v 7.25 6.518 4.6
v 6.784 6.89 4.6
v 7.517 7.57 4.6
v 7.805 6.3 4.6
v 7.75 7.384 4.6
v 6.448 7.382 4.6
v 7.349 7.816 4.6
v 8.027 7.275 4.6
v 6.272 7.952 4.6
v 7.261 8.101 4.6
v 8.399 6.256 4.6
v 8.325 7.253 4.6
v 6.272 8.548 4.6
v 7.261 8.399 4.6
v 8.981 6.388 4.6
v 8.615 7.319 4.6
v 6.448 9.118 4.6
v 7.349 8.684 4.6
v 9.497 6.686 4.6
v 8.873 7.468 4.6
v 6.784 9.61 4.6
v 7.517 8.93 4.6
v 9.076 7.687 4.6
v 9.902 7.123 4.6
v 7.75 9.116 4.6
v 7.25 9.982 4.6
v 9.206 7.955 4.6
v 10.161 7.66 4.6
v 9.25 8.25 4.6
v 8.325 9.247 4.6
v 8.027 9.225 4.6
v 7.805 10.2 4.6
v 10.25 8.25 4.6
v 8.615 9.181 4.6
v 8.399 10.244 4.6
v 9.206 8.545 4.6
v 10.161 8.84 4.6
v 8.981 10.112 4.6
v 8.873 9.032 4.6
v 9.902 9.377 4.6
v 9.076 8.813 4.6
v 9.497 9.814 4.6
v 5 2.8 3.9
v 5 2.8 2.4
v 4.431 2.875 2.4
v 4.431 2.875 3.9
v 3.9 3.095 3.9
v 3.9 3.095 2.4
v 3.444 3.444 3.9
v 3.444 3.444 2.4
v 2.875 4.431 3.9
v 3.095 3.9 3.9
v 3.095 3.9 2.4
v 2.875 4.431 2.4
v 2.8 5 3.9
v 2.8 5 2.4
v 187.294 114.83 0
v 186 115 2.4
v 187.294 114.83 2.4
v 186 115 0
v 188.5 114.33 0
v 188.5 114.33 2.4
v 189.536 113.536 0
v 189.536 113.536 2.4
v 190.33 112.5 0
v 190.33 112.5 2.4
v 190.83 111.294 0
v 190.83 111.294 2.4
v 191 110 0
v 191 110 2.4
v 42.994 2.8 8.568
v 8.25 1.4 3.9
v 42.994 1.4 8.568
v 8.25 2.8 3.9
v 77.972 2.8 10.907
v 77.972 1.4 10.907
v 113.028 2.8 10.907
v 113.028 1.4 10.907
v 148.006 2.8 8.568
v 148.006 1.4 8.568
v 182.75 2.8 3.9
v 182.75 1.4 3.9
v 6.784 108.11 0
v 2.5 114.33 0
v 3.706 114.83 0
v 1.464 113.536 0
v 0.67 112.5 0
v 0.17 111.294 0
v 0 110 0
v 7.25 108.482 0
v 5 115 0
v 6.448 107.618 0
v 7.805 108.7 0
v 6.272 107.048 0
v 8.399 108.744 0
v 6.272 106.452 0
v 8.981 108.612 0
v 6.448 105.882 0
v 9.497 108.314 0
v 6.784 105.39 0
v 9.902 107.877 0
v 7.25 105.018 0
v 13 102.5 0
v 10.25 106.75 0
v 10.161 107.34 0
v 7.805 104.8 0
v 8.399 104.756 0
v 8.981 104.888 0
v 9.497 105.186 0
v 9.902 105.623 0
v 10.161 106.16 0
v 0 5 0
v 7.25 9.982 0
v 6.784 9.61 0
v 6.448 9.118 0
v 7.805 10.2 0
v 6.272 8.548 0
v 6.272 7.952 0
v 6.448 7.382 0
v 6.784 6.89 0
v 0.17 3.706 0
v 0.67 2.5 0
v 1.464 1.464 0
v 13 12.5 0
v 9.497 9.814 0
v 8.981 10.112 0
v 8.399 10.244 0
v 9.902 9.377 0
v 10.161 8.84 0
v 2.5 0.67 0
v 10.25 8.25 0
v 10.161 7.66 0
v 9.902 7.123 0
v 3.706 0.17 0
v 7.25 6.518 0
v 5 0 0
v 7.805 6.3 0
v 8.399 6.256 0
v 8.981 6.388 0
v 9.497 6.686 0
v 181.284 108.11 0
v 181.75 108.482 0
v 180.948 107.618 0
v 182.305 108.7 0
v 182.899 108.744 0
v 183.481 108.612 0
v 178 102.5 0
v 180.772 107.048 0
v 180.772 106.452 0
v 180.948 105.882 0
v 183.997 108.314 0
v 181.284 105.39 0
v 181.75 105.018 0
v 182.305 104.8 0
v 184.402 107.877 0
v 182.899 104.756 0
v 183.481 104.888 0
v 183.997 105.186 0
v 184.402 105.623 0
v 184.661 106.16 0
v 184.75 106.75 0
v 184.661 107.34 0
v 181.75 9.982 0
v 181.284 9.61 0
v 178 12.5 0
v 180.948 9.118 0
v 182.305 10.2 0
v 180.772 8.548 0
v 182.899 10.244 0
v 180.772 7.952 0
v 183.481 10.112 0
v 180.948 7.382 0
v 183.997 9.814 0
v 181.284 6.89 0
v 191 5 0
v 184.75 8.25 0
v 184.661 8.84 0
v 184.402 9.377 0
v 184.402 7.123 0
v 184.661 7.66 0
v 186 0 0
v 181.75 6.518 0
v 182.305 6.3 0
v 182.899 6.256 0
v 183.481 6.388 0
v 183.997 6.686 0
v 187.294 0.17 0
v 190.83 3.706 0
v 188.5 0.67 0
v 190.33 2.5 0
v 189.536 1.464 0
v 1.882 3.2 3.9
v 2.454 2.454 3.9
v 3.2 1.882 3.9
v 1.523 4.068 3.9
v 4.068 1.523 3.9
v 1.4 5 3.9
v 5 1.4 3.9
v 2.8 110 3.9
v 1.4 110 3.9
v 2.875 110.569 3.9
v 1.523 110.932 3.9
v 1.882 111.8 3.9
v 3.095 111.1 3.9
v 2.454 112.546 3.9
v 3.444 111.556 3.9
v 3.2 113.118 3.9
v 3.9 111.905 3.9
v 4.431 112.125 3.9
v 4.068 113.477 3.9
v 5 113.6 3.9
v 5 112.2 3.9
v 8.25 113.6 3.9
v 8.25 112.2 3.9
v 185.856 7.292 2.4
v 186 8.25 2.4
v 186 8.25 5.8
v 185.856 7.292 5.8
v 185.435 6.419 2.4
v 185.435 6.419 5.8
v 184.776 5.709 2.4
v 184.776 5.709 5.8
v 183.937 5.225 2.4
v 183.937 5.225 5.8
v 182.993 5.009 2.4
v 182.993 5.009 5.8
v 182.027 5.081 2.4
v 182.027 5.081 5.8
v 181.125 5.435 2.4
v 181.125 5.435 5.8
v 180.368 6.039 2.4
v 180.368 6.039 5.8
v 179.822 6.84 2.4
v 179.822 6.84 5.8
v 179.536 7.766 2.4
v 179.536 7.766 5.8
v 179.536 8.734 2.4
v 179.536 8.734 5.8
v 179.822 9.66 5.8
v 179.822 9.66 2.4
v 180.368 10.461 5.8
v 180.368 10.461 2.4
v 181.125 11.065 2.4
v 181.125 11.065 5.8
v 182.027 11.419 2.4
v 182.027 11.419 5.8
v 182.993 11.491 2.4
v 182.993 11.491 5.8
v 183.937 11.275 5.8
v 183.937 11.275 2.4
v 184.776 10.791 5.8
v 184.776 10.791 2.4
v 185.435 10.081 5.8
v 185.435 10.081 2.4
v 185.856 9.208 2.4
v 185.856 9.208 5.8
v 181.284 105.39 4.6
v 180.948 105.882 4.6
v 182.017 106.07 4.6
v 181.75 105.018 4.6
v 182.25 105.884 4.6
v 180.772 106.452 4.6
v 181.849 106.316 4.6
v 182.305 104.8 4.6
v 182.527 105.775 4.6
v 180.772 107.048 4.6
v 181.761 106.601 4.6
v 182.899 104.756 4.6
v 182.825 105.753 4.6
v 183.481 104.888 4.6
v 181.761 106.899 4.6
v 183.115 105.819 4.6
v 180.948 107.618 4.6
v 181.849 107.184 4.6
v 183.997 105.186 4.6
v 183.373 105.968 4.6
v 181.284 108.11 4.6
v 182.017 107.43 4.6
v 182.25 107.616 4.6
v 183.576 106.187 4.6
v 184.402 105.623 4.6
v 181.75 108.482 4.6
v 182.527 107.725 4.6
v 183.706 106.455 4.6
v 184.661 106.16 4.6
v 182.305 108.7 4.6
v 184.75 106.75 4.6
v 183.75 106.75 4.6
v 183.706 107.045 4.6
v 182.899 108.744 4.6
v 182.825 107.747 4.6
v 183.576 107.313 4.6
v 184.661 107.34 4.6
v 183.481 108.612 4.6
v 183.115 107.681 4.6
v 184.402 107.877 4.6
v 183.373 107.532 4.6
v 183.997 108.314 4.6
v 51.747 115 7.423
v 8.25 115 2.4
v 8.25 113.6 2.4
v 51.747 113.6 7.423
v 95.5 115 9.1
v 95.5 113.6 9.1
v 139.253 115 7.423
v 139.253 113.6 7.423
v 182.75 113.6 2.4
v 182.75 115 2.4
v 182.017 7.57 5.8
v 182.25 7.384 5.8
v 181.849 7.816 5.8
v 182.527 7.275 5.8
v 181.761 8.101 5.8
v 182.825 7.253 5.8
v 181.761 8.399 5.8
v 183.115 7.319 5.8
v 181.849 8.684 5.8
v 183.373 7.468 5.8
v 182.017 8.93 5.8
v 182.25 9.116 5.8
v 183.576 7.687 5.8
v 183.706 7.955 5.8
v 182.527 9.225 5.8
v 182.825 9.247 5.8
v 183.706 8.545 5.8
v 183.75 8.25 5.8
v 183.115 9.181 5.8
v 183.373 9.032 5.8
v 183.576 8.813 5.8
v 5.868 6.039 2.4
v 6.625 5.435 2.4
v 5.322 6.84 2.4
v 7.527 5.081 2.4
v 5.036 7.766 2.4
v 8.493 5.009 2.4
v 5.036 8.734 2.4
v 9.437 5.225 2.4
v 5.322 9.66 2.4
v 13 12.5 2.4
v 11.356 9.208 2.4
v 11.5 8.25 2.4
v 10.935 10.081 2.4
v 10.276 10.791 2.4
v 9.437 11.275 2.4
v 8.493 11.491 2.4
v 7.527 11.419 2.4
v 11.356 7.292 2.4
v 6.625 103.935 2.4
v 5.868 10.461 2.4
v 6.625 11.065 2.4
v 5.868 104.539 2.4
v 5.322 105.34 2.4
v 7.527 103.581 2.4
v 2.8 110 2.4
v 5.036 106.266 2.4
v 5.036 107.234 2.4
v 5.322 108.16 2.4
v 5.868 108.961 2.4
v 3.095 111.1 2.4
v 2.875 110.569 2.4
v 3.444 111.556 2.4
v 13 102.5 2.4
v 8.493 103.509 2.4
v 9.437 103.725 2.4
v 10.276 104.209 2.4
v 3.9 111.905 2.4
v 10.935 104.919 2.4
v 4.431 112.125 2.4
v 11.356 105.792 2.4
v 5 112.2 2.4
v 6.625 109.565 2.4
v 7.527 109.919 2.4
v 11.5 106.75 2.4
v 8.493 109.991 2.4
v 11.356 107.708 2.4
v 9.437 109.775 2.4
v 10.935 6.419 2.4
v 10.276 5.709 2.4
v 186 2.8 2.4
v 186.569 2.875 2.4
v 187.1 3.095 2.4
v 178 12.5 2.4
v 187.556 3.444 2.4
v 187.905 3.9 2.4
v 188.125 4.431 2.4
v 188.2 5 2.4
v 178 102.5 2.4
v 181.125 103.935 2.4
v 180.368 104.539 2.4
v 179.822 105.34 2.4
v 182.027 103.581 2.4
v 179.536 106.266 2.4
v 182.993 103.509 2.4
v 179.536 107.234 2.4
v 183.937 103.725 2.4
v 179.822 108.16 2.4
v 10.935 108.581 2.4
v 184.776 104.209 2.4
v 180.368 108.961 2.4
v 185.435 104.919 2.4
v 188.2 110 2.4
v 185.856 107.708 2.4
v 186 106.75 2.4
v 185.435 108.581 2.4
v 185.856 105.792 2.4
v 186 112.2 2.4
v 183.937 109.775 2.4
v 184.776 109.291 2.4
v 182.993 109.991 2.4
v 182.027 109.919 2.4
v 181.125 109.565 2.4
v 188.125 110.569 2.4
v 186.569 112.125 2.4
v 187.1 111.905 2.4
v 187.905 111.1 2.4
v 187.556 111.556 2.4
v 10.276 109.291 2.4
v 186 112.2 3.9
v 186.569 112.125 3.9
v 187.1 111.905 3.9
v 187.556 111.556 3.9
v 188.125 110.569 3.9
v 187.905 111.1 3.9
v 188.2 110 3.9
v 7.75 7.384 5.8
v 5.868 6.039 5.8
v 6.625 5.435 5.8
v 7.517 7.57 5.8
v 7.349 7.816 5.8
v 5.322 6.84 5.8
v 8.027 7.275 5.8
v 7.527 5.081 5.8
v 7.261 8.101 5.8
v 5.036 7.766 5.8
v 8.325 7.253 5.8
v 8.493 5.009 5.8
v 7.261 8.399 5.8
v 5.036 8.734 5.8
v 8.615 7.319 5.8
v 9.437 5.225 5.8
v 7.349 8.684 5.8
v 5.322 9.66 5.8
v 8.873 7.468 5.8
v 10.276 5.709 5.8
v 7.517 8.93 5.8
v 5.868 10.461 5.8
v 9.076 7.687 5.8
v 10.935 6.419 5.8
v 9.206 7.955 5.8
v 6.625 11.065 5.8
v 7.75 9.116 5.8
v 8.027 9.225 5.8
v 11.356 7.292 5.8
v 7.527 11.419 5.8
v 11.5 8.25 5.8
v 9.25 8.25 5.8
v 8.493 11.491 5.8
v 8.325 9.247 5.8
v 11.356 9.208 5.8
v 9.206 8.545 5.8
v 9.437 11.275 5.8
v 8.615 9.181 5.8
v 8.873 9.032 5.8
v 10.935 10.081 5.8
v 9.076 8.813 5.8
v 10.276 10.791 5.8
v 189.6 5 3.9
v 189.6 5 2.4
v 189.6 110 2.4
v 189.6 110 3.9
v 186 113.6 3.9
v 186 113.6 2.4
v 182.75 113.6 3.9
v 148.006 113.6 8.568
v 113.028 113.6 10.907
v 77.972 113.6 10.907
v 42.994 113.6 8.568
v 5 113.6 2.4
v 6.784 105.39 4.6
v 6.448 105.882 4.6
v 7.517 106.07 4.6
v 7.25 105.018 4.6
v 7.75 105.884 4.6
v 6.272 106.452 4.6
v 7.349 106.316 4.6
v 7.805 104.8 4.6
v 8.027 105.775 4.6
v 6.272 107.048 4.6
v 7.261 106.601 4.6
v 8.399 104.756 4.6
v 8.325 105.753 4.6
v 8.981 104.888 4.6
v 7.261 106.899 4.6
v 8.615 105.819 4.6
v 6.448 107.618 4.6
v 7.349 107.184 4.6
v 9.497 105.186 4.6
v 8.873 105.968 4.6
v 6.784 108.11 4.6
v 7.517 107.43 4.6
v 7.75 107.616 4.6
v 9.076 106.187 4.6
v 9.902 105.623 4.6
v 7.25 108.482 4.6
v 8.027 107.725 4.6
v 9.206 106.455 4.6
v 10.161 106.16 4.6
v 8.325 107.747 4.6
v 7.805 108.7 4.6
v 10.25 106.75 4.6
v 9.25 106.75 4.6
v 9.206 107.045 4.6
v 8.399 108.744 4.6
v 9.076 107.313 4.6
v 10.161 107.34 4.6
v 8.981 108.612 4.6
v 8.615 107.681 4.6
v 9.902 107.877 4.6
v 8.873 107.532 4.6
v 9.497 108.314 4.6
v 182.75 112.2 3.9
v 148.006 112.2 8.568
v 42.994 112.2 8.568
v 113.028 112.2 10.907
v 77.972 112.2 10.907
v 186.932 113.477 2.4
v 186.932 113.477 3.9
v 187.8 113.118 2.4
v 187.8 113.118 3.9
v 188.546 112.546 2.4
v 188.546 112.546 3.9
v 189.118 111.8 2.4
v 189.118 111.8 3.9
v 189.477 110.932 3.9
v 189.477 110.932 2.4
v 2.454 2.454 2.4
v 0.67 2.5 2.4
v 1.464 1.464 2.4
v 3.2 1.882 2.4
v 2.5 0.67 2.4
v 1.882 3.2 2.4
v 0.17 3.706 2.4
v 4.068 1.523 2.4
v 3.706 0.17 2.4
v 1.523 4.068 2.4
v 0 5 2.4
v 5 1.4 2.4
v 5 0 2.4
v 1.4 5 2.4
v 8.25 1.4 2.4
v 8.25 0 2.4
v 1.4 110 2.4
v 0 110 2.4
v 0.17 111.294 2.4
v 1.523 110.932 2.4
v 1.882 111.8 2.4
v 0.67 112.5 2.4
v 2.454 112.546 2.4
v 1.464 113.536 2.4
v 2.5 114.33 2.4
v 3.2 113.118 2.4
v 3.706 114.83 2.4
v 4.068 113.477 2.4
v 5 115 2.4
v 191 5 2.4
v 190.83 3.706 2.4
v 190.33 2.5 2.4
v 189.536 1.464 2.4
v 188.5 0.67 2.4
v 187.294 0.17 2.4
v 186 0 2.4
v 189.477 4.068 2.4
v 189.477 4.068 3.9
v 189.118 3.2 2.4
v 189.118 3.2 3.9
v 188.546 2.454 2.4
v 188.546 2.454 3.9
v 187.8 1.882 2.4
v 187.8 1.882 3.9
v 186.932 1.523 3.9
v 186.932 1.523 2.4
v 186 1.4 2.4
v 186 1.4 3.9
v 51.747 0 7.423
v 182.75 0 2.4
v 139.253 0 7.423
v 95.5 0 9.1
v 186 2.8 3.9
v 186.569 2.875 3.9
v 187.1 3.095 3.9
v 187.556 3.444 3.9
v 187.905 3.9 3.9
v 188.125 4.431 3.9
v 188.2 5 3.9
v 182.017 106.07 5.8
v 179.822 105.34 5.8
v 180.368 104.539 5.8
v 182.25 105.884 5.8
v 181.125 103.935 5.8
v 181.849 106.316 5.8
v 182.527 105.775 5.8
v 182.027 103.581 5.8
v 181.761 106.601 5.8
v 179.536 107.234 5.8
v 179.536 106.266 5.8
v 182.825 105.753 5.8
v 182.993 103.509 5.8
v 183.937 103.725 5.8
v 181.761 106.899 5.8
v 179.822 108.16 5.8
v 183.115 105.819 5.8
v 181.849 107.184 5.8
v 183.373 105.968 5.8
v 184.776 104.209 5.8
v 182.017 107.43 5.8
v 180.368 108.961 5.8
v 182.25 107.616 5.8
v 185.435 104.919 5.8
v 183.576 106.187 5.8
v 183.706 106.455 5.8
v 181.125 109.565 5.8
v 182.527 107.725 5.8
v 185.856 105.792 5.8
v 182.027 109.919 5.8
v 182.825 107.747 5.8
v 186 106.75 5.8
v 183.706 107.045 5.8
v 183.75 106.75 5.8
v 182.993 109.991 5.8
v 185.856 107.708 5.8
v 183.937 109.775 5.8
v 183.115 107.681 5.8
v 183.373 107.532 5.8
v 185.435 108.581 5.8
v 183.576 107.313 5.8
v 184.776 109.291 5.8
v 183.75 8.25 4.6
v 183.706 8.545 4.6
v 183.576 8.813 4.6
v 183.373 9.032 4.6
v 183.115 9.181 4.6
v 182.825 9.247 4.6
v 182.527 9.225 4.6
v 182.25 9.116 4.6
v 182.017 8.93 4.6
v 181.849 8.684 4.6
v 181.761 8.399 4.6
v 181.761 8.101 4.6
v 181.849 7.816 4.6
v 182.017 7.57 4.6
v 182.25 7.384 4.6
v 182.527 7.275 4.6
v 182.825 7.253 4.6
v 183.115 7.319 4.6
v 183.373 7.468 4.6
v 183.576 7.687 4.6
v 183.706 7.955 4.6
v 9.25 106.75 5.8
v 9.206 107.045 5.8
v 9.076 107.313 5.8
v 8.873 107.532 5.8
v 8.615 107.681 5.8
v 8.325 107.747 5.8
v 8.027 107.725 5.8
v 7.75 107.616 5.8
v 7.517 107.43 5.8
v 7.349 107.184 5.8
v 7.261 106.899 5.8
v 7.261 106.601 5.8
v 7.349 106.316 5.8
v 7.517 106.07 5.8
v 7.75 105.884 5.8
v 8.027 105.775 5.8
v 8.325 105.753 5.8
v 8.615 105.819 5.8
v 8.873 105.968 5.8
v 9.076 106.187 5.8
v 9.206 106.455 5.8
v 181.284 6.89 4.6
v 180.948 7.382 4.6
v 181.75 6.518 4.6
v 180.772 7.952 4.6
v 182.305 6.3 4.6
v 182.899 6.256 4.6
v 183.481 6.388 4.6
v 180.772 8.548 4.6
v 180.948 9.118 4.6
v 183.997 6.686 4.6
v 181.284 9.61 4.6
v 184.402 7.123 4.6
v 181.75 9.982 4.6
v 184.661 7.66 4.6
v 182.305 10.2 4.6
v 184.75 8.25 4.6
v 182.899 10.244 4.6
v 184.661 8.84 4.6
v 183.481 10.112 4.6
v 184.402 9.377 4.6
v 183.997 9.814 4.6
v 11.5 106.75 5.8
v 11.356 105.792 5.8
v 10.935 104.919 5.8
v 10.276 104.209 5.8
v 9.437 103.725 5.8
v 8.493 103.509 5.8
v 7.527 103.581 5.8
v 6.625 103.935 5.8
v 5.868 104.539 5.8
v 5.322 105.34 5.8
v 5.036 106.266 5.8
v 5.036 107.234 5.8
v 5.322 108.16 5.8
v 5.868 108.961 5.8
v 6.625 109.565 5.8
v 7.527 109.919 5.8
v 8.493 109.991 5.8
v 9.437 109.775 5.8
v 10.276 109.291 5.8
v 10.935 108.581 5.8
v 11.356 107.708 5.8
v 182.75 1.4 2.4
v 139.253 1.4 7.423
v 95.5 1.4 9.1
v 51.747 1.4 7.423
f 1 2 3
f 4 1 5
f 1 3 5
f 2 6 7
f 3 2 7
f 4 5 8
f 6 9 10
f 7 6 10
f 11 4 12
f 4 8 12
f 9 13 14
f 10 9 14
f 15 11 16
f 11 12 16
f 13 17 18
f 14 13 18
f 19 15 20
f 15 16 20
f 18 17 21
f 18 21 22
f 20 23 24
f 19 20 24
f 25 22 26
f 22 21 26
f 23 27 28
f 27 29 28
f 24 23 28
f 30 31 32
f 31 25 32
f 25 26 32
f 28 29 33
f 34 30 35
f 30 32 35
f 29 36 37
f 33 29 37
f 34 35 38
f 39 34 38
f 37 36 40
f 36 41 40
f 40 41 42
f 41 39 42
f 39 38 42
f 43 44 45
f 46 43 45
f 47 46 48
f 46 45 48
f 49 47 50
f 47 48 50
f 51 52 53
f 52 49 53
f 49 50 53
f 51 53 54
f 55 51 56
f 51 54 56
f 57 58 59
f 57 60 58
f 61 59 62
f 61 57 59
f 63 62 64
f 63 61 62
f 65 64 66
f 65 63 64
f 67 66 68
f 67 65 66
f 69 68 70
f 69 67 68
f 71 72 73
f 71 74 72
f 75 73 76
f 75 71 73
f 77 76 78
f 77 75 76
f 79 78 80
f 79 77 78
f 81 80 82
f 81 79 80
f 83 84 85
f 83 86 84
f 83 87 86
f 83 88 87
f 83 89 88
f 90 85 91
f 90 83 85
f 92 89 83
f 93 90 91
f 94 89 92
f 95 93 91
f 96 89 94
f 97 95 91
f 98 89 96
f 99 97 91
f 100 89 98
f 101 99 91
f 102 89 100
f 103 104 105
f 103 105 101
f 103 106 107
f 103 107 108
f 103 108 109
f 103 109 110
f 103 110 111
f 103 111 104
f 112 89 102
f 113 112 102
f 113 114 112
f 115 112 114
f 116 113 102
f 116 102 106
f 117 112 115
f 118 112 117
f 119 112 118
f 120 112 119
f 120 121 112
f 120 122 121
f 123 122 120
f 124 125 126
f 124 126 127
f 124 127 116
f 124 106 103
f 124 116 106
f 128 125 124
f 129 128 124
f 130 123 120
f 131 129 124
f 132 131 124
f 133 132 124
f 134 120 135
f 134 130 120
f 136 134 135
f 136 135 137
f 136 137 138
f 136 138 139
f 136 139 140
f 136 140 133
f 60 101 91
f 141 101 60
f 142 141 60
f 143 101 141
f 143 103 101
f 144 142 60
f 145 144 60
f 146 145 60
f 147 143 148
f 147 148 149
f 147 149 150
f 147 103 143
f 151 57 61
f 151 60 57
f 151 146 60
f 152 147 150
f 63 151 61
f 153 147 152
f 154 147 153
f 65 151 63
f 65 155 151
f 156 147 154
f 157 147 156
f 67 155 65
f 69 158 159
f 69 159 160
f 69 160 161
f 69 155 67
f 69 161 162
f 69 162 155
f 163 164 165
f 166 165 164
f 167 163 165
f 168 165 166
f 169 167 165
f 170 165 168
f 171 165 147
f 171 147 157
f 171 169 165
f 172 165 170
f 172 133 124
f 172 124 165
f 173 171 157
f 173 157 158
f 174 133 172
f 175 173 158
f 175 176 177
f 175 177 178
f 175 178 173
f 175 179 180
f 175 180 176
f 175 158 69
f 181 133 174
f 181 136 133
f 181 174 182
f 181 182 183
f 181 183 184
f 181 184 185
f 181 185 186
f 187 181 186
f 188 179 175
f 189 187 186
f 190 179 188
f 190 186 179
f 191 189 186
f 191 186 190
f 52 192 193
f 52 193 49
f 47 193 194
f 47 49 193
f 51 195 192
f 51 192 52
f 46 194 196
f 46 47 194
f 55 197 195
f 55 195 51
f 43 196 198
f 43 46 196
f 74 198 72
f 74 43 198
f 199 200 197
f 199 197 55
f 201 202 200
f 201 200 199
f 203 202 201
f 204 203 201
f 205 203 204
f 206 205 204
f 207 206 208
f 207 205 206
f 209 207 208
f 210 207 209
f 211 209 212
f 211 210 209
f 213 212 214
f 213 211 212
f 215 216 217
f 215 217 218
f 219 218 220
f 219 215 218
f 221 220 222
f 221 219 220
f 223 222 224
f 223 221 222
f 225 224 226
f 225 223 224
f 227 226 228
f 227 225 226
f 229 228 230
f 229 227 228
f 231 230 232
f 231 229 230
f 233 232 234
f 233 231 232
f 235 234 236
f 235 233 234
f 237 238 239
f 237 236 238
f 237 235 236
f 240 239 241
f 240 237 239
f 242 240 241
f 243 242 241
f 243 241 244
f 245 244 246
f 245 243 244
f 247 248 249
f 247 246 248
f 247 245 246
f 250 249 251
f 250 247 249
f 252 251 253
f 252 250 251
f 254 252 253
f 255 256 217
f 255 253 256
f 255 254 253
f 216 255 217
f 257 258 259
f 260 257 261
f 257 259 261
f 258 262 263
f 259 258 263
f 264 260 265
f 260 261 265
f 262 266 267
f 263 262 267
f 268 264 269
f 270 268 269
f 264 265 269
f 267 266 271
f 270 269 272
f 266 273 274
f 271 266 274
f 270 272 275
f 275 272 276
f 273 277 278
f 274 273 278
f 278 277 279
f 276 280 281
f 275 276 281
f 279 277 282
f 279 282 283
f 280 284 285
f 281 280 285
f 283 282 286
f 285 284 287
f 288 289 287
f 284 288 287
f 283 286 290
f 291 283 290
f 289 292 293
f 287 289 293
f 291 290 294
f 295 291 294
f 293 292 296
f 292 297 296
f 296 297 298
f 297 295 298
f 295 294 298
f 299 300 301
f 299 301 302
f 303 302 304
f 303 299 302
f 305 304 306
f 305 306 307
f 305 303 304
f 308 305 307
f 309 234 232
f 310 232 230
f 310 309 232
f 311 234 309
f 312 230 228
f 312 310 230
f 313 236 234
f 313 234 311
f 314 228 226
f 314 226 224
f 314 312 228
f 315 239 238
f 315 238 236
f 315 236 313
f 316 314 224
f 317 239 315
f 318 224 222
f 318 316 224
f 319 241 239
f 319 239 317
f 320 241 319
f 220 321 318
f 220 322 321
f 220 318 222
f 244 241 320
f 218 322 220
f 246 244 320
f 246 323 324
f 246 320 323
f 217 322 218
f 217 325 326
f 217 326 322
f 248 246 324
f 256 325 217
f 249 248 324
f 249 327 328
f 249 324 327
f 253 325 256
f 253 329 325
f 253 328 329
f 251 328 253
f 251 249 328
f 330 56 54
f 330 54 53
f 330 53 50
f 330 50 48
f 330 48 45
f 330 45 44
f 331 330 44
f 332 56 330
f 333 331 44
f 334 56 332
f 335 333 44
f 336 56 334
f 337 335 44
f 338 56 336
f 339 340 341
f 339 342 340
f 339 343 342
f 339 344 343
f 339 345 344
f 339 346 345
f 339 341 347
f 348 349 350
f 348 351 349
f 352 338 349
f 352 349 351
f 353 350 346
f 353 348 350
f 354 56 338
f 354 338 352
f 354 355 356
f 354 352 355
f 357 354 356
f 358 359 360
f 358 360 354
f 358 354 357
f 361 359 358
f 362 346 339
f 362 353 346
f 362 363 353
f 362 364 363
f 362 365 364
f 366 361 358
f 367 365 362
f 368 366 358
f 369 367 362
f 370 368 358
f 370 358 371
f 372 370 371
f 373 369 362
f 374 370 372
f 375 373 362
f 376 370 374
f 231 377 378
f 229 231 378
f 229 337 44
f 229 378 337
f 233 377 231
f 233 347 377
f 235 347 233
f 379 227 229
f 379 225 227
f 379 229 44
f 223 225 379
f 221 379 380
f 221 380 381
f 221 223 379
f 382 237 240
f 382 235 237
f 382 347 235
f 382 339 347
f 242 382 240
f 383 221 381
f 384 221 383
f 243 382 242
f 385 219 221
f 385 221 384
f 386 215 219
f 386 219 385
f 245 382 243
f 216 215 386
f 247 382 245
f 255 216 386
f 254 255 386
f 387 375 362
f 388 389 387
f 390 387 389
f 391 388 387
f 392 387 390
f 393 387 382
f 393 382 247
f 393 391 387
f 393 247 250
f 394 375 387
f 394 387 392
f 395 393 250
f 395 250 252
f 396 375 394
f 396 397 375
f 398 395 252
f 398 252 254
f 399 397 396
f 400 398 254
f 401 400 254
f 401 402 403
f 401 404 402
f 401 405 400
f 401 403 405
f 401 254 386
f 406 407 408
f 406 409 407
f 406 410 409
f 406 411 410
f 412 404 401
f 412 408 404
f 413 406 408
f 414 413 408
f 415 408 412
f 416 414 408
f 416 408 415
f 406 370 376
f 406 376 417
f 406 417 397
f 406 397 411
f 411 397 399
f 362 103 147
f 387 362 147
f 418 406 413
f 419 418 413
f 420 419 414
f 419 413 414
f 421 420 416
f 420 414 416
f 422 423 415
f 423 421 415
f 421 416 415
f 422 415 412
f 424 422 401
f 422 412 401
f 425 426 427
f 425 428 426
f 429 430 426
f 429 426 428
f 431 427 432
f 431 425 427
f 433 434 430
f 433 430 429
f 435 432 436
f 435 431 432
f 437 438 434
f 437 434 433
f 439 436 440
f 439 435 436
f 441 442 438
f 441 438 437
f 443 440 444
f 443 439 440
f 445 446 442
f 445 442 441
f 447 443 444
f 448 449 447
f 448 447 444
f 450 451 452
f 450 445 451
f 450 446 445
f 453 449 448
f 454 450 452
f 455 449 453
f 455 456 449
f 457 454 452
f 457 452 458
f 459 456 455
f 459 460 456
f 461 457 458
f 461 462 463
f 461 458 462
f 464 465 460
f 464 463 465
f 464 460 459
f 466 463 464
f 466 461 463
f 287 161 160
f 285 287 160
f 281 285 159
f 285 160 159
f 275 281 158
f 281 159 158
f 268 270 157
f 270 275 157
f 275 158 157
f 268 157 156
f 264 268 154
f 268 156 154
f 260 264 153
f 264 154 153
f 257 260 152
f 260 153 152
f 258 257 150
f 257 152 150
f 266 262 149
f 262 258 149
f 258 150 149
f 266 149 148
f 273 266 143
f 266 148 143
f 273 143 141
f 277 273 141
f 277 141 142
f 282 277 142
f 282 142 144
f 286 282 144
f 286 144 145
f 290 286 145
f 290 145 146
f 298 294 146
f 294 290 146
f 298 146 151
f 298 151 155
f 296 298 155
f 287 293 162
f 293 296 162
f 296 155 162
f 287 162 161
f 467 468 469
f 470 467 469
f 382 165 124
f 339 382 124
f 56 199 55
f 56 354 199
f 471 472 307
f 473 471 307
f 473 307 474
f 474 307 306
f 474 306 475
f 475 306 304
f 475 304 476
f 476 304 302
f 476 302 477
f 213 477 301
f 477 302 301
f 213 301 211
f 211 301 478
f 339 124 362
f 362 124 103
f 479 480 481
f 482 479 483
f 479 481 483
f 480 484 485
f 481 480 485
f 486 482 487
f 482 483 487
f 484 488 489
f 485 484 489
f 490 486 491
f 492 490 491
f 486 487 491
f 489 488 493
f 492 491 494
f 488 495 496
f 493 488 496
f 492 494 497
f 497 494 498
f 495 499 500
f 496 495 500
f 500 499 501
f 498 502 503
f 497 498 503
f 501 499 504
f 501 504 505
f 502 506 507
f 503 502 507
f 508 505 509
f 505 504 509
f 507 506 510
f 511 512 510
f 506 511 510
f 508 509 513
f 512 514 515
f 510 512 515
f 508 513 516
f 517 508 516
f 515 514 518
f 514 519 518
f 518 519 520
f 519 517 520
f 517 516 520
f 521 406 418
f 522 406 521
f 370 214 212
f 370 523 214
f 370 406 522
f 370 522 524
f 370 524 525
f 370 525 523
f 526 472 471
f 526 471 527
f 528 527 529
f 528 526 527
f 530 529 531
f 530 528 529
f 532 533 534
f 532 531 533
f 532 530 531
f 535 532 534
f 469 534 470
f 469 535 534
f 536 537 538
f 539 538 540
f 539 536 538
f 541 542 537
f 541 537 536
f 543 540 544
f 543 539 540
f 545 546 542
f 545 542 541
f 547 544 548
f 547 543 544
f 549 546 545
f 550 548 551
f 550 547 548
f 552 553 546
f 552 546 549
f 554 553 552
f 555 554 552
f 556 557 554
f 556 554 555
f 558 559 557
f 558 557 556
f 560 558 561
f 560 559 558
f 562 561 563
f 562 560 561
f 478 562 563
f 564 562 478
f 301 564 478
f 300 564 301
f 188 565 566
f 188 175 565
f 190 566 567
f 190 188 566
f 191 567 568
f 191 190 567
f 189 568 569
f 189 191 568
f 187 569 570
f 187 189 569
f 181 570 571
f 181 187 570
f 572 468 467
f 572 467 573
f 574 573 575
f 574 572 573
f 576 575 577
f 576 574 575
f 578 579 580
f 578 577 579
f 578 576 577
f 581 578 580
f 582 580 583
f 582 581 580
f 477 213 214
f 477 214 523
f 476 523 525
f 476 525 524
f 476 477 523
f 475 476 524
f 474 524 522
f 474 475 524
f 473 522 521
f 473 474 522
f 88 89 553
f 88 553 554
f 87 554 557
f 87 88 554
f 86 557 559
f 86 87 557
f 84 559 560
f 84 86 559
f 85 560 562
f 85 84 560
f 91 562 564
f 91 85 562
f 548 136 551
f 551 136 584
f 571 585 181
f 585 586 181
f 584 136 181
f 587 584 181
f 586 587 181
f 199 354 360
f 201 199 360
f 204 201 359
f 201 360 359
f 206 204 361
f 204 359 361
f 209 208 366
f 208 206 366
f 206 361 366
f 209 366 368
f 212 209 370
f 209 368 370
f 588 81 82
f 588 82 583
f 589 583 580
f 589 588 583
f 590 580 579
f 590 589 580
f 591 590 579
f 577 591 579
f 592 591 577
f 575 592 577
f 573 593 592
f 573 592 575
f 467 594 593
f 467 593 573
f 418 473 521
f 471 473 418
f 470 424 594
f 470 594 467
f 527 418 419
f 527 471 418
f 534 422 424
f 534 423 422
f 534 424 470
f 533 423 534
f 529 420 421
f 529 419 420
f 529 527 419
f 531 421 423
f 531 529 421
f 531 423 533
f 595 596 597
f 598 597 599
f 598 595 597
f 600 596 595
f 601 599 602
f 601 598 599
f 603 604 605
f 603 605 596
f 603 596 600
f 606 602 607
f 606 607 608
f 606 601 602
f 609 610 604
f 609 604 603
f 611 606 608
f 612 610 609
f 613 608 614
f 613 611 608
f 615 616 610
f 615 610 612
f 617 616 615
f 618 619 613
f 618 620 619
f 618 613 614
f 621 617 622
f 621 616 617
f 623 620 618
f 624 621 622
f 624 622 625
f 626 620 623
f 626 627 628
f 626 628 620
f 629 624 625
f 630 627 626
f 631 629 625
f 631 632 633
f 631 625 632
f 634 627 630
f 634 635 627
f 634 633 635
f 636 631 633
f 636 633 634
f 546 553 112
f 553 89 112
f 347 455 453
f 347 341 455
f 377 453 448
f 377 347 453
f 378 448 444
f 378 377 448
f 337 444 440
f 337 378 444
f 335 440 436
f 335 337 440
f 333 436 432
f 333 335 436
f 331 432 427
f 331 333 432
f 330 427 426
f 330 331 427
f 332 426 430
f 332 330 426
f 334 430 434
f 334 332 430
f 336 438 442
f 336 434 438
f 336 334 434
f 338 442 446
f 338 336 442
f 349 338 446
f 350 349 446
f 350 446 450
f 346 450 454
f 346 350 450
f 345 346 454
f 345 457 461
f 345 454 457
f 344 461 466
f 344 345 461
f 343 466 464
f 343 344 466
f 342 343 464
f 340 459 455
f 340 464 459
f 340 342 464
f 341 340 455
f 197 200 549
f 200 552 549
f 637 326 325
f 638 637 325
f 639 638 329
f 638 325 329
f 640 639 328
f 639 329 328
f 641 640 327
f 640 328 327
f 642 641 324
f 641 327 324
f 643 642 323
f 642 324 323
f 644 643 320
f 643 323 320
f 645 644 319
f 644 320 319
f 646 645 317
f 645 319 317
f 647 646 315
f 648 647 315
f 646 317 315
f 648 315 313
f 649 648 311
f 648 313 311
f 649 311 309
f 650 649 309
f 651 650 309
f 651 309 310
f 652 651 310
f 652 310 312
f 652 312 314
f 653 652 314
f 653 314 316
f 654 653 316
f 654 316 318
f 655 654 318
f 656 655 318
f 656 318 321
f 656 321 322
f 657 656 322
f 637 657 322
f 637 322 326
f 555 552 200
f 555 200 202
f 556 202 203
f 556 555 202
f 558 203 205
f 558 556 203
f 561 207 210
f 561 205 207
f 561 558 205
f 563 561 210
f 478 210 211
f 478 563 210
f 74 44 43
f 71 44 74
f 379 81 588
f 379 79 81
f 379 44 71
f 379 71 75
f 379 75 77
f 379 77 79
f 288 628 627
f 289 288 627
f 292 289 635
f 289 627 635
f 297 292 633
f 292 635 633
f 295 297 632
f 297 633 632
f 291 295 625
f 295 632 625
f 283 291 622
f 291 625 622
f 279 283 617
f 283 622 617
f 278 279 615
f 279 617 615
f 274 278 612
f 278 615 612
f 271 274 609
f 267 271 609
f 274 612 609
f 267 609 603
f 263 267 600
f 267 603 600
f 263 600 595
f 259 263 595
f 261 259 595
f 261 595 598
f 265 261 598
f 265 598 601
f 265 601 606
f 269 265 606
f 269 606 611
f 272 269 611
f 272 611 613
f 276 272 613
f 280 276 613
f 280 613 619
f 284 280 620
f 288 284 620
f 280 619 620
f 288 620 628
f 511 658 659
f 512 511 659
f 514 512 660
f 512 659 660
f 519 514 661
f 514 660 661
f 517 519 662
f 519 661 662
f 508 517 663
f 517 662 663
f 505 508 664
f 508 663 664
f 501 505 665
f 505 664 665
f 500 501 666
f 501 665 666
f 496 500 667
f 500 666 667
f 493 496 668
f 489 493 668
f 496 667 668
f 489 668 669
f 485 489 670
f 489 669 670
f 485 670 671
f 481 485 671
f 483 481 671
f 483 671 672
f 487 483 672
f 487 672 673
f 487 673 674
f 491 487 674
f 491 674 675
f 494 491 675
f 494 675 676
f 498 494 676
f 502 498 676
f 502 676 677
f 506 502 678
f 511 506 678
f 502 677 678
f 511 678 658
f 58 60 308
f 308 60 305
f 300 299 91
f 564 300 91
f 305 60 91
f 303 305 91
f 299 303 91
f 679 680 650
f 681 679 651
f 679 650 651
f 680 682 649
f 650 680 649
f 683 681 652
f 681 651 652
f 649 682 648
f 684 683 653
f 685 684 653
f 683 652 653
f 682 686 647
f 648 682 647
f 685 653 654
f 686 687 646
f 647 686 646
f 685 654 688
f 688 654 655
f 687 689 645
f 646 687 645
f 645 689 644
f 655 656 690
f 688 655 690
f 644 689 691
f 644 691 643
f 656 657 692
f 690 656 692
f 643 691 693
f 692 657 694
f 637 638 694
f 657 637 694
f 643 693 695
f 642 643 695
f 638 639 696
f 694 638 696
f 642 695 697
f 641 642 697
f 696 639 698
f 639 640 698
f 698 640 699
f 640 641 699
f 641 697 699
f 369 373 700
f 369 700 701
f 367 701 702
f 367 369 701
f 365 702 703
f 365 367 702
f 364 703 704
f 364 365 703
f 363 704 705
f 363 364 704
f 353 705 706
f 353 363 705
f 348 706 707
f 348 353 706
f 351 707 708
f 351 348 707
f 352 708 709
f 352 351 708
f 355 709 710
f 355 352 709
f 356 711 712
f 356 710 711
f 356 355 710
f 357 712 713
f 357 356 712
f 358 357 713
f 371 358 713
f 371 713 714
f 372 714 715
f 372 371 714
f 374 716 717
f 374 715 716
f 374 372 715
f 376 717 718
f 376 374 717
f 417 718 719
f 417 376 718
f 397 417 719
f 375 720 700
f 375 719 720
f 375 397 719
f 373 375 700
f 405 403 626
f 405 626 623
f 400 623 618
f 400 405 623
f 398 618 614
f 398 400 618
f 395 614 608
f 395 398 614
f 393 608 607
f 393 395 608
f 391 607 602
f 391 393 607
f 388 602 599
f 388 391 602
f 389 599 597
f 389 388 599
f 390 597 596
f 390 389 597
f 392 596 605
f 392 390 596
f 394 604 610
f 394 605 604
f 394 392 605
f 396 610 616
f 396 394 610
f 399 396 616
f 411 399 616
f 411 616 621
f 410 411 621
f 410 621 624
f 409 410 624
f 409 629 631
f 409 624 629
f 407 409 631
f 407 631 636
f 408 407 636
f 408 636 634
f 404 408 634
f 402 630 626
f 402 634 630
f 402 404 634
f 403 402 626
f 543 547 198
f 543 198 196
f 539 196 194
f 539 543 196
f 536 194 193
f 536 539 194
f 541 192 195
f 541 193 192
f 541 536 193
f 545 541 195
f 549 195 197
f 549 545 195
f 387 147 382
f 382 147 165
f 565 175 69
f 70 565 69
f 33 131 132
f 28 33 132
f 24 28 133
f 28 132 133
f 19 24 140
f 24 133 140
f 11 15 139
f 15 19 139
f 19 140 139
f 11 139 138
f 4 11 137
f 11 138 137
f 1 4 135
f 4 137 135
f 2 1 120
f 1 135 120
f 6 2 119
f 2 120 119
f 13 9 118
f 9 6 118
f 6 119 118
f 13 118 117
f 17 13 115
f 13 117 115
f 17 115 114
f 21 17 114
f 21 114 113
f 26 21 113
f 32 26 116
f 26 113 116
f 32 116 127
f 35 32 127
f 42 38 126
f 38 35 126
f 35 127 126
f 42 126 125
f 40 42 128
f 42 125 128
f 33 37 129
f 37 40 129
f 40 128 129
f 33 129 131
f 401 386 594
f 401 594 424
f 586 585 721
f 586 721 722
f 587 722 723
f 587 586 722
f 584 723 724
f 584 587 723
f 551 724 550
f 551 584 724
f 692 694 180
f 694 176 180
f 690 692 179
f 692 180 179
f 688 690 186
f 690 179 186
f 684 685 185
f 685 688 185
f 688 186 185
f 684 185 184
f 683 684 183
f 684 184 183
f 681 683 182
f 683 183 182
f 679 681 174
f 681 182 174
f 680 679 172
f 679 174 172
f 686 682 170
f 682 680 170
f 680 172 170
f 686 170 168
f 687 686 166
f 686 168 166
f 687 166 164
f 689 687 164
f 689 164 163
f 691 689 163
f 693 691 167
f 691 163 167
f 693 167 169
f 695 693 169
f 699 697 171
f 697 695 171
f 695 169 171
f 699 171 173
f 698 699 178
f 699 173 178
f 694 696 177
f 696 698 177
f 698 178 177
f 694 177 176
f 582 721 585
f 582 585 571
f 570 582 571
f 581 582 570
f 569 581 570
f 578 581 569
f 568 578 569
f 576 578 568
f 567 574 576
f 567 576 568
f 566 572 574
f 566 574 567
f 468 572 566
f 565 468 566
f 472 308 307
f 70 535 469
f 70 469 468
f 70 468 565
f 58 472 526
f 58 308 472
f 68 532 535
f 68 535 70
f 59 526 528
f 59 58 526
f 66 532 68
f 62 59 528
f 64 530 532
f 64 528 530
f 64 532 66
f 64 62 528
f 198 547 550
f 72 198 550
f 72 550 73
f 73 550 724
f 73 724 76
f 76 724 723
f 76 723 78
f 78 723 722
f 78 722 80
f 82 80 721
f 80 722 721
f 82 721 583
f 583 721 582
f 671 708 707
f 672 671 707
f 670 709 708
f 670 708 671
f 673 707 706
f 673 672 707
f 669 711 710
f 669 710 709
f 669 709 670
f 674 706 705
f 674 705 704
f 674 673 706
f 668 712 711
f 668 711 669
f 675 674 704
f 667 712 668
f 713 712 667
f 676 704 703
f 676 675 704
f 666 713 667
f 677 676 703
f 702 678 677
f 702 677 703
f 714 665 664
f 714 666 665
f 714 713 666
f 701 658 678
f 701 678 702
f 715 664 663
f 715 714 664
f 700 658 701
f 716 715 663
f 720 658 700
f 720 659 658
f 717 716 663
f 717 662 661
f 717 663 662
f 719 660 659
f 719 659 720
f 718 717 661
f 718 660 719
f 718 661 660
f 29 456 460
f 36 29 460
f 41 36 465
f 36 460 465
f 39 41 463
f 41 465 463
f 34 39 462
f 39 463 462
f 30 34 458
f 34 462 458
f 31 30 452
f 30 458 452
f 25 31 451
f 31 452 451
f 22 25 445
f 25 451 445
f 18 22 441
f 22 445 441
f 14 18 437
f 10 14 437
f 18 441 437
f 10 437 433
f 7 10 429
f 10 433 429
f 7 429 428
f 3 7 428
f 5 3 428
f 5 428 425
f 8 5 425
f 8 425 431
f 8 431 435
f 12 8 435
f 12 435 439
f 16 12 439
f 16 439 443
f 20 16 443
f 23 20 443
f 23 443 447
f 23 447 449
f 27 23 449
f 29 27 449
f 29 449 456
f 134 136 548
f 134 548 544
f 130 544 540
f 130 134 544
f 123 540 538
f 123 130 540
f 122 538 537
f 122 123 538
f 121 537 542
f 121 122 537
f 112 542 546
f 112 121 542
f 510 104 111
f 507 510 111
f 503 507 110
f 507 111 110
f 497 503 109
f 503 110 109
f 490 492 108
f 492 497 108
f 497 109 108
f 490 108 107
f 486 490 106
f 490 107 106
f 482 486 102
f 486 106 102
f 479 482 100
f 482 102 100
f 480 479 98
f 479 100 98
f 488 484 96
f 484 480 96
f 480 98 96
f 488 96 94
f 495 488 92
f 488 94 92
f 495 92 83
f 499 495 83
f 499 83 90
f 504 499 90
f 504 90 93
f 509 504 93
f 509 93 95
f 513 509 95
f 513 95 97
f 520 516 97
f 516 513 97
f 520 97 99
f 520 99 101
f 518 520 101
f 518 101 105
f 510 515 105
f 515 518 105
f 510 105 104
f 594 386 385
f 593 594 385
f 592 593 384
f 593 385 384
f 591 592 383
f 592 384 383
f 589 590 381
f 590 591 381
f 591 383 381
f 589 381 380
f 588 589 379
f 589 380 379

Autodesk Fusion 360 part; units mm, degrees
sketch "sketch_ecran_base" plane through (0, 0, 0) normal (0, 0, 1) x (1, 0, 0)
  line L0 (5, 0) -> (186, 0)
  line L1 (191, 5) -> (191, 110)
  line L2 (186, 115) -> (5, 115)
  line L3 (0, 110) -> (0, 5)
  arc A0 (5, 115) -> (0, 110) centre (5, 110) ccw
  arc A1 (191, 110) -> (186, 115) centre (186, 110) ccw
  arc A2 (186, 0) -> (191, 5) centre (186, 5) ccw
  arc A3 (0, 5) -> (5, 0) centre (5, 5) ccw
  line L4 (6.5, 111.5) -> (184.5, 111.5)
  line L5 (187, 109) -> (187, 6)
  line L6 (184.5, 3.5) -> (6.5, 3.5)
  line L7 (4, 6) -> (4, 109)
  arc A4 (6.5, 111.5) -> (4, 109) centre (6.5, 109) ccw
  arc A5 (187, 109) -> (184.5, 111.5) centre (184.5, 109) ccw
  arc A6 (184.5, 3.5) -> (187, 6) centre (184.5, 6) ccw
  arc A7 (4, 6) -> (6.5, 3.5) centre (6.5, 6) ccw
  point P0 (191, 0)
  point P1 (0, 115)
  point P2 (4, 111.5)
  point P3 (187, 111.5)
  point P4 (4, 3.5)
  dimension "d1" = 191
  dimension "d2" = 115
  dimension "d3" = 5
  dimension "d4" = 5
  dimension "d5" = 183
  dimension "d6" = 108
  dimension "d7" = 2.5
  dimension "d8" = 2.5
  dimension "d9" = 4
  dimension "d10" = 3.5
extrude "Extrude1" add sketch "sketch_ecran_base" along normal blind 15 contours L0 L1 L2 L3 A0 A1 A2 A3 | L4 L5 L6 L7 A4 A5 A6 A7 makes body 1
extrude "Extrude2" add sketch "sketch_ecran_base" along normal blind 0.4 from surface at 15 contours L4 L5 L6 L7 A4 A5 A6 A7 bodies 1
sketch "sketch_ecran_sides" plane through (0, 0, 0) normal (0, -1, 0) x (1, 0, 0)
  line L0 (5, 0) -> (186, 0)
  line L1 (186, 0) -> (186, 15)
  line L2 (186, 15) -> (5, 15)
  line L3 (5, 15) -> (5, 0)
  line L4 (95.5, 15) -> (95.5, 7) construction
  arc A0 (186, 0) -> (5, 0) centre (95.5, -581.5179) ccw
  dimension "d16" = 8
extrude "Extrude3" cut sketch "sketch_ecran_sides" against normal blind 125 contours L0 A0 bodies 1
chamfer "Chamfer1" distance 1.3 distance2 1.8 8 edges at (0, 57.5, 15) (1.4645, 1.4645, 15) (95.5, 0, 15) (189.5355, 1.4645, 15) (191, 57.5, 15) (189.5355, 113.5355, 15) (95.5, 115, 15) (1.4645, 113.5355, 15) measured on face at (189.6667, 74.6667, 15) measured on face at (189.6667, 74.6667, 15) measured on face at (189.6667, 74.6667, 15) measured on face at (189.6667, 74.6667, 15) measured on face at (189.6667, 74.6667, 15) measured on face at (189.6667, 74.6667, 15) measured on face at (189.6667, 74.6667, 15) measured on face at (189.6667, 74.6667, 15) on bodies 1
sketch "sketch_backplate_base" plane through (0, 0, 0) normal (0, 0, 1) x (1, 0, 0)
  line L0 (5, 0) -> (186, 0)
  line L1 (191, 5) -> (191, 110)
  line L2 (186, 115) -> (5, 115)
  line L3 (0, 110) -> (0, 5)
  circle A0 centre (8.25, 106.75) radius 3.25
  circle A1 centre (8.25, 106.75) radius 2
  circle A2 centre (8.25, 106.75) radius 1
  line L4 (95.5, 115) -> (95.5, 0) construction
  line L5 (0, 57.5) -> (191, 57.5) construction
  circle A3 centre (182.75, 106.75) radius 3.25
  circle A4 centre (182.75, 106.75) radius 2
  circle A5 centre (182.75, 106.75) radius 1
  circle A6 centre (8.25, 8.25) radius 3.25
  circle A7 centre (8.25, 8.25) radius 2
  circle A8 centre (8.25, 8.25) radius 1
  circle A9 centre (182.75, 8.25) radius 3.25
  circle A10 centre (182.75, 8.25) radius 2
  circle A11 centre (182.75, 8.25) radius 1
  arc A12 (5, 115) -> (0, 110) centre (5, 110) ccw
  arc A13 (191, 110) -> (186, 115) centre (186, 110) ccw
  arc A14 (186, 0) -> (191, 5) centre (186, 5) ccw
  arc A15 (0, 5) -> (5, 0) centre (5, 5) ccw
  line L6 (1.4, 110) -> (1.4, 5)
  arc A16 (1.4, 5) -> (5, 1.4) centre (5, 5) ccw
  line L7 (5, 1.4) -> (186, 1.4)
  arc A17 (186, 1.4) -> (189.6, 5) centre (186, 5) ccw
  line L8 (189.6, 5) -> (189.6, 110)
  arc A18 (189.6, 110) -> (186, 113.6) centre (186, 110) ccw
  line L9 (186, 113.6) -> (5, 113.6)
  arc A19 (5, 113.6) -> (1.4, 110) centre (5, 110) ccw
  line L10 (5, 2.8) -> (186, 2.8)
  arc A20 (186, 2.8) -> (188.2, 5) centre (186, 5) ccw
  line L11 (188.2, 5) -> (188.2, 110)
  arc A21 (188.2, 110) -> (186, 112.2) centre (186, 110) ccw
  line L12 (186, 112.2) -> (5, 112.2)
  arc A22 (5, 112.2) -> (2.8, 110) centre (5, 110) ccw
  line L13 (2.8, 110) -> (2.8, 5)
  arc A23 (2.8, 5) -> (5, 2.8) centre (5, 5) ccw
  line L14 (13, 102.5) -> (178, 102.5)
  line L15 (178, 102.5) -> (178, 12.5)
  line L16 (178, 12.5) -> (13, 12.5)
  line L17 (13, 12.5) -> (13, 102.5)
  point P0 (191, 0)
  point P1 (0, 115)
  point P2 (13, 57.5)
  point P3 (178, 57.5)
  point P4 (95.5, 102.5)
  dimension "d21" = 191
  dimension "d22" = 115
  dimension "d23" = 6.5
  dimension "d24" = 8.25
  dimension "d25" = 8.25
  dimension "d26" = 4
  dimension "d27" = 2
  dimension "d28" = 5
  dimension "d29" = -1.4
  dimension "d30" = -2.8
  dimension "d57" = 165
  dimension "d58" = 90
sketch "sketch_backplate_side" plane through (0, 0, 0) normal (0, 1, 0) x (1, 0, 0)
  line L0 (0, 0) -> (191, 0)
  line L1 (95.5, 0) -> (95.5, -11.2) construction
  line L2 (0, 0) -> (0, -2.4)
  line L3 (0, -2.4) -> (8.25, -2.4)
  line L4 (8.25, 0) -> (8.25, -2.4)
  line L5 (0, -2.4) -> (0, -3.9)
  line L6 (0, -3.9) -> (8.25, -3.9)
  line L7 (8.25, -2.4) -> (8.25, -3.9)
  line L8 (191, -3.9) -> (182.75, -3.9)
  line L9 (191, -2.4) -> (182.75, -2.4)
  line L10 (191, 0) -> (191, -2.4)
  line L11 (191, -2.4) -> (191, -3.9)
  arc A0 (8.25, -2.4) -> (182.75, -2.4) centre (95.5, 562.3517) ccw
  arc A1 (8.25, -3.9) -> (182.75, -3.9) centre (95.5, 513.8584) ccw
  line L12 (182.75, 0) -> (182.75, -2.4)
  line L13 (182.75, -2.4) -> (182.75, -3.9)
  point P0 (8.25, 0)
  point P1 (182.75, 0)
  point P2 (95.5, -9.1)
  dimension "d31" = 191
  dimension "d32" = 8.25
  dimension "d33" = 11.2
  dimension "d34" = 2.4
  dimension "d35" = 1.5
  dimension "d36" = 9.1
extrude "Extrude4" add sketch "sketch_backplate_base" along normal blind 3.9 separate body contours L6 A16 L7 A17 L8 A18 L9 A19 makes body 2
extrude "Extrude5" add sketch "sketch_backplate_base" along normal blind 2.4 contours L0 L1 L2 L3 A12 A13 A14 A15 | L10 A20 L11 A21 L12 A22 L13 A23 bodies 2
extrude "Extrude6" add sketch "sketch_backplate_side" along normal blind 2.8 contours L0 L4 A0 L12 bodies 2
extrude "Extrude7" add sketch "sketch_backplate_side" against normal blind 1.4 from surface at 2.8 contours L7 A0 A1 L13 bodies 2
extrude "Extrude8" add sketch "sketch_backplate_side" against normal blind 2.8 from surface at 115 contours L0 L4 A0 L12 | L7 A0 A1 L13 bodies 2
extrude "Extrude9" cut sketch "sketch_backplate_side" against normal blind 1.4 from surface at 115 contours L7 A0 A1 L13 bodies 2
extrude "Extrude10" add sketch "sketch_backplate_base" along normal blind 5.8 contours A0 | A3 | A6 | A9 bodies 2
extrude "Extrude11" add sketch "sketch_backplate_base" against normal blind 1.2 from surface at 5.8 contours A1 | A4 | A7 | A10 bodies 2
hidden bodies 1
equation "d9 = ( ( 191 - 183 ) / 2 ) * 1 mm"
equation "d10 = ( ( 115 - 108 ) / 2 ) * 1 mm"
equation "d24 = 5 mm + ( ( 6.5 / 2 ) * 1 mm )"
equation "d25 = 5 mm + ( ( 6.5 / 2 ) * 1 mm )"
equation "d32 = 5 mm + ( ( 6.5 / 2 ) * 1 mm )"
